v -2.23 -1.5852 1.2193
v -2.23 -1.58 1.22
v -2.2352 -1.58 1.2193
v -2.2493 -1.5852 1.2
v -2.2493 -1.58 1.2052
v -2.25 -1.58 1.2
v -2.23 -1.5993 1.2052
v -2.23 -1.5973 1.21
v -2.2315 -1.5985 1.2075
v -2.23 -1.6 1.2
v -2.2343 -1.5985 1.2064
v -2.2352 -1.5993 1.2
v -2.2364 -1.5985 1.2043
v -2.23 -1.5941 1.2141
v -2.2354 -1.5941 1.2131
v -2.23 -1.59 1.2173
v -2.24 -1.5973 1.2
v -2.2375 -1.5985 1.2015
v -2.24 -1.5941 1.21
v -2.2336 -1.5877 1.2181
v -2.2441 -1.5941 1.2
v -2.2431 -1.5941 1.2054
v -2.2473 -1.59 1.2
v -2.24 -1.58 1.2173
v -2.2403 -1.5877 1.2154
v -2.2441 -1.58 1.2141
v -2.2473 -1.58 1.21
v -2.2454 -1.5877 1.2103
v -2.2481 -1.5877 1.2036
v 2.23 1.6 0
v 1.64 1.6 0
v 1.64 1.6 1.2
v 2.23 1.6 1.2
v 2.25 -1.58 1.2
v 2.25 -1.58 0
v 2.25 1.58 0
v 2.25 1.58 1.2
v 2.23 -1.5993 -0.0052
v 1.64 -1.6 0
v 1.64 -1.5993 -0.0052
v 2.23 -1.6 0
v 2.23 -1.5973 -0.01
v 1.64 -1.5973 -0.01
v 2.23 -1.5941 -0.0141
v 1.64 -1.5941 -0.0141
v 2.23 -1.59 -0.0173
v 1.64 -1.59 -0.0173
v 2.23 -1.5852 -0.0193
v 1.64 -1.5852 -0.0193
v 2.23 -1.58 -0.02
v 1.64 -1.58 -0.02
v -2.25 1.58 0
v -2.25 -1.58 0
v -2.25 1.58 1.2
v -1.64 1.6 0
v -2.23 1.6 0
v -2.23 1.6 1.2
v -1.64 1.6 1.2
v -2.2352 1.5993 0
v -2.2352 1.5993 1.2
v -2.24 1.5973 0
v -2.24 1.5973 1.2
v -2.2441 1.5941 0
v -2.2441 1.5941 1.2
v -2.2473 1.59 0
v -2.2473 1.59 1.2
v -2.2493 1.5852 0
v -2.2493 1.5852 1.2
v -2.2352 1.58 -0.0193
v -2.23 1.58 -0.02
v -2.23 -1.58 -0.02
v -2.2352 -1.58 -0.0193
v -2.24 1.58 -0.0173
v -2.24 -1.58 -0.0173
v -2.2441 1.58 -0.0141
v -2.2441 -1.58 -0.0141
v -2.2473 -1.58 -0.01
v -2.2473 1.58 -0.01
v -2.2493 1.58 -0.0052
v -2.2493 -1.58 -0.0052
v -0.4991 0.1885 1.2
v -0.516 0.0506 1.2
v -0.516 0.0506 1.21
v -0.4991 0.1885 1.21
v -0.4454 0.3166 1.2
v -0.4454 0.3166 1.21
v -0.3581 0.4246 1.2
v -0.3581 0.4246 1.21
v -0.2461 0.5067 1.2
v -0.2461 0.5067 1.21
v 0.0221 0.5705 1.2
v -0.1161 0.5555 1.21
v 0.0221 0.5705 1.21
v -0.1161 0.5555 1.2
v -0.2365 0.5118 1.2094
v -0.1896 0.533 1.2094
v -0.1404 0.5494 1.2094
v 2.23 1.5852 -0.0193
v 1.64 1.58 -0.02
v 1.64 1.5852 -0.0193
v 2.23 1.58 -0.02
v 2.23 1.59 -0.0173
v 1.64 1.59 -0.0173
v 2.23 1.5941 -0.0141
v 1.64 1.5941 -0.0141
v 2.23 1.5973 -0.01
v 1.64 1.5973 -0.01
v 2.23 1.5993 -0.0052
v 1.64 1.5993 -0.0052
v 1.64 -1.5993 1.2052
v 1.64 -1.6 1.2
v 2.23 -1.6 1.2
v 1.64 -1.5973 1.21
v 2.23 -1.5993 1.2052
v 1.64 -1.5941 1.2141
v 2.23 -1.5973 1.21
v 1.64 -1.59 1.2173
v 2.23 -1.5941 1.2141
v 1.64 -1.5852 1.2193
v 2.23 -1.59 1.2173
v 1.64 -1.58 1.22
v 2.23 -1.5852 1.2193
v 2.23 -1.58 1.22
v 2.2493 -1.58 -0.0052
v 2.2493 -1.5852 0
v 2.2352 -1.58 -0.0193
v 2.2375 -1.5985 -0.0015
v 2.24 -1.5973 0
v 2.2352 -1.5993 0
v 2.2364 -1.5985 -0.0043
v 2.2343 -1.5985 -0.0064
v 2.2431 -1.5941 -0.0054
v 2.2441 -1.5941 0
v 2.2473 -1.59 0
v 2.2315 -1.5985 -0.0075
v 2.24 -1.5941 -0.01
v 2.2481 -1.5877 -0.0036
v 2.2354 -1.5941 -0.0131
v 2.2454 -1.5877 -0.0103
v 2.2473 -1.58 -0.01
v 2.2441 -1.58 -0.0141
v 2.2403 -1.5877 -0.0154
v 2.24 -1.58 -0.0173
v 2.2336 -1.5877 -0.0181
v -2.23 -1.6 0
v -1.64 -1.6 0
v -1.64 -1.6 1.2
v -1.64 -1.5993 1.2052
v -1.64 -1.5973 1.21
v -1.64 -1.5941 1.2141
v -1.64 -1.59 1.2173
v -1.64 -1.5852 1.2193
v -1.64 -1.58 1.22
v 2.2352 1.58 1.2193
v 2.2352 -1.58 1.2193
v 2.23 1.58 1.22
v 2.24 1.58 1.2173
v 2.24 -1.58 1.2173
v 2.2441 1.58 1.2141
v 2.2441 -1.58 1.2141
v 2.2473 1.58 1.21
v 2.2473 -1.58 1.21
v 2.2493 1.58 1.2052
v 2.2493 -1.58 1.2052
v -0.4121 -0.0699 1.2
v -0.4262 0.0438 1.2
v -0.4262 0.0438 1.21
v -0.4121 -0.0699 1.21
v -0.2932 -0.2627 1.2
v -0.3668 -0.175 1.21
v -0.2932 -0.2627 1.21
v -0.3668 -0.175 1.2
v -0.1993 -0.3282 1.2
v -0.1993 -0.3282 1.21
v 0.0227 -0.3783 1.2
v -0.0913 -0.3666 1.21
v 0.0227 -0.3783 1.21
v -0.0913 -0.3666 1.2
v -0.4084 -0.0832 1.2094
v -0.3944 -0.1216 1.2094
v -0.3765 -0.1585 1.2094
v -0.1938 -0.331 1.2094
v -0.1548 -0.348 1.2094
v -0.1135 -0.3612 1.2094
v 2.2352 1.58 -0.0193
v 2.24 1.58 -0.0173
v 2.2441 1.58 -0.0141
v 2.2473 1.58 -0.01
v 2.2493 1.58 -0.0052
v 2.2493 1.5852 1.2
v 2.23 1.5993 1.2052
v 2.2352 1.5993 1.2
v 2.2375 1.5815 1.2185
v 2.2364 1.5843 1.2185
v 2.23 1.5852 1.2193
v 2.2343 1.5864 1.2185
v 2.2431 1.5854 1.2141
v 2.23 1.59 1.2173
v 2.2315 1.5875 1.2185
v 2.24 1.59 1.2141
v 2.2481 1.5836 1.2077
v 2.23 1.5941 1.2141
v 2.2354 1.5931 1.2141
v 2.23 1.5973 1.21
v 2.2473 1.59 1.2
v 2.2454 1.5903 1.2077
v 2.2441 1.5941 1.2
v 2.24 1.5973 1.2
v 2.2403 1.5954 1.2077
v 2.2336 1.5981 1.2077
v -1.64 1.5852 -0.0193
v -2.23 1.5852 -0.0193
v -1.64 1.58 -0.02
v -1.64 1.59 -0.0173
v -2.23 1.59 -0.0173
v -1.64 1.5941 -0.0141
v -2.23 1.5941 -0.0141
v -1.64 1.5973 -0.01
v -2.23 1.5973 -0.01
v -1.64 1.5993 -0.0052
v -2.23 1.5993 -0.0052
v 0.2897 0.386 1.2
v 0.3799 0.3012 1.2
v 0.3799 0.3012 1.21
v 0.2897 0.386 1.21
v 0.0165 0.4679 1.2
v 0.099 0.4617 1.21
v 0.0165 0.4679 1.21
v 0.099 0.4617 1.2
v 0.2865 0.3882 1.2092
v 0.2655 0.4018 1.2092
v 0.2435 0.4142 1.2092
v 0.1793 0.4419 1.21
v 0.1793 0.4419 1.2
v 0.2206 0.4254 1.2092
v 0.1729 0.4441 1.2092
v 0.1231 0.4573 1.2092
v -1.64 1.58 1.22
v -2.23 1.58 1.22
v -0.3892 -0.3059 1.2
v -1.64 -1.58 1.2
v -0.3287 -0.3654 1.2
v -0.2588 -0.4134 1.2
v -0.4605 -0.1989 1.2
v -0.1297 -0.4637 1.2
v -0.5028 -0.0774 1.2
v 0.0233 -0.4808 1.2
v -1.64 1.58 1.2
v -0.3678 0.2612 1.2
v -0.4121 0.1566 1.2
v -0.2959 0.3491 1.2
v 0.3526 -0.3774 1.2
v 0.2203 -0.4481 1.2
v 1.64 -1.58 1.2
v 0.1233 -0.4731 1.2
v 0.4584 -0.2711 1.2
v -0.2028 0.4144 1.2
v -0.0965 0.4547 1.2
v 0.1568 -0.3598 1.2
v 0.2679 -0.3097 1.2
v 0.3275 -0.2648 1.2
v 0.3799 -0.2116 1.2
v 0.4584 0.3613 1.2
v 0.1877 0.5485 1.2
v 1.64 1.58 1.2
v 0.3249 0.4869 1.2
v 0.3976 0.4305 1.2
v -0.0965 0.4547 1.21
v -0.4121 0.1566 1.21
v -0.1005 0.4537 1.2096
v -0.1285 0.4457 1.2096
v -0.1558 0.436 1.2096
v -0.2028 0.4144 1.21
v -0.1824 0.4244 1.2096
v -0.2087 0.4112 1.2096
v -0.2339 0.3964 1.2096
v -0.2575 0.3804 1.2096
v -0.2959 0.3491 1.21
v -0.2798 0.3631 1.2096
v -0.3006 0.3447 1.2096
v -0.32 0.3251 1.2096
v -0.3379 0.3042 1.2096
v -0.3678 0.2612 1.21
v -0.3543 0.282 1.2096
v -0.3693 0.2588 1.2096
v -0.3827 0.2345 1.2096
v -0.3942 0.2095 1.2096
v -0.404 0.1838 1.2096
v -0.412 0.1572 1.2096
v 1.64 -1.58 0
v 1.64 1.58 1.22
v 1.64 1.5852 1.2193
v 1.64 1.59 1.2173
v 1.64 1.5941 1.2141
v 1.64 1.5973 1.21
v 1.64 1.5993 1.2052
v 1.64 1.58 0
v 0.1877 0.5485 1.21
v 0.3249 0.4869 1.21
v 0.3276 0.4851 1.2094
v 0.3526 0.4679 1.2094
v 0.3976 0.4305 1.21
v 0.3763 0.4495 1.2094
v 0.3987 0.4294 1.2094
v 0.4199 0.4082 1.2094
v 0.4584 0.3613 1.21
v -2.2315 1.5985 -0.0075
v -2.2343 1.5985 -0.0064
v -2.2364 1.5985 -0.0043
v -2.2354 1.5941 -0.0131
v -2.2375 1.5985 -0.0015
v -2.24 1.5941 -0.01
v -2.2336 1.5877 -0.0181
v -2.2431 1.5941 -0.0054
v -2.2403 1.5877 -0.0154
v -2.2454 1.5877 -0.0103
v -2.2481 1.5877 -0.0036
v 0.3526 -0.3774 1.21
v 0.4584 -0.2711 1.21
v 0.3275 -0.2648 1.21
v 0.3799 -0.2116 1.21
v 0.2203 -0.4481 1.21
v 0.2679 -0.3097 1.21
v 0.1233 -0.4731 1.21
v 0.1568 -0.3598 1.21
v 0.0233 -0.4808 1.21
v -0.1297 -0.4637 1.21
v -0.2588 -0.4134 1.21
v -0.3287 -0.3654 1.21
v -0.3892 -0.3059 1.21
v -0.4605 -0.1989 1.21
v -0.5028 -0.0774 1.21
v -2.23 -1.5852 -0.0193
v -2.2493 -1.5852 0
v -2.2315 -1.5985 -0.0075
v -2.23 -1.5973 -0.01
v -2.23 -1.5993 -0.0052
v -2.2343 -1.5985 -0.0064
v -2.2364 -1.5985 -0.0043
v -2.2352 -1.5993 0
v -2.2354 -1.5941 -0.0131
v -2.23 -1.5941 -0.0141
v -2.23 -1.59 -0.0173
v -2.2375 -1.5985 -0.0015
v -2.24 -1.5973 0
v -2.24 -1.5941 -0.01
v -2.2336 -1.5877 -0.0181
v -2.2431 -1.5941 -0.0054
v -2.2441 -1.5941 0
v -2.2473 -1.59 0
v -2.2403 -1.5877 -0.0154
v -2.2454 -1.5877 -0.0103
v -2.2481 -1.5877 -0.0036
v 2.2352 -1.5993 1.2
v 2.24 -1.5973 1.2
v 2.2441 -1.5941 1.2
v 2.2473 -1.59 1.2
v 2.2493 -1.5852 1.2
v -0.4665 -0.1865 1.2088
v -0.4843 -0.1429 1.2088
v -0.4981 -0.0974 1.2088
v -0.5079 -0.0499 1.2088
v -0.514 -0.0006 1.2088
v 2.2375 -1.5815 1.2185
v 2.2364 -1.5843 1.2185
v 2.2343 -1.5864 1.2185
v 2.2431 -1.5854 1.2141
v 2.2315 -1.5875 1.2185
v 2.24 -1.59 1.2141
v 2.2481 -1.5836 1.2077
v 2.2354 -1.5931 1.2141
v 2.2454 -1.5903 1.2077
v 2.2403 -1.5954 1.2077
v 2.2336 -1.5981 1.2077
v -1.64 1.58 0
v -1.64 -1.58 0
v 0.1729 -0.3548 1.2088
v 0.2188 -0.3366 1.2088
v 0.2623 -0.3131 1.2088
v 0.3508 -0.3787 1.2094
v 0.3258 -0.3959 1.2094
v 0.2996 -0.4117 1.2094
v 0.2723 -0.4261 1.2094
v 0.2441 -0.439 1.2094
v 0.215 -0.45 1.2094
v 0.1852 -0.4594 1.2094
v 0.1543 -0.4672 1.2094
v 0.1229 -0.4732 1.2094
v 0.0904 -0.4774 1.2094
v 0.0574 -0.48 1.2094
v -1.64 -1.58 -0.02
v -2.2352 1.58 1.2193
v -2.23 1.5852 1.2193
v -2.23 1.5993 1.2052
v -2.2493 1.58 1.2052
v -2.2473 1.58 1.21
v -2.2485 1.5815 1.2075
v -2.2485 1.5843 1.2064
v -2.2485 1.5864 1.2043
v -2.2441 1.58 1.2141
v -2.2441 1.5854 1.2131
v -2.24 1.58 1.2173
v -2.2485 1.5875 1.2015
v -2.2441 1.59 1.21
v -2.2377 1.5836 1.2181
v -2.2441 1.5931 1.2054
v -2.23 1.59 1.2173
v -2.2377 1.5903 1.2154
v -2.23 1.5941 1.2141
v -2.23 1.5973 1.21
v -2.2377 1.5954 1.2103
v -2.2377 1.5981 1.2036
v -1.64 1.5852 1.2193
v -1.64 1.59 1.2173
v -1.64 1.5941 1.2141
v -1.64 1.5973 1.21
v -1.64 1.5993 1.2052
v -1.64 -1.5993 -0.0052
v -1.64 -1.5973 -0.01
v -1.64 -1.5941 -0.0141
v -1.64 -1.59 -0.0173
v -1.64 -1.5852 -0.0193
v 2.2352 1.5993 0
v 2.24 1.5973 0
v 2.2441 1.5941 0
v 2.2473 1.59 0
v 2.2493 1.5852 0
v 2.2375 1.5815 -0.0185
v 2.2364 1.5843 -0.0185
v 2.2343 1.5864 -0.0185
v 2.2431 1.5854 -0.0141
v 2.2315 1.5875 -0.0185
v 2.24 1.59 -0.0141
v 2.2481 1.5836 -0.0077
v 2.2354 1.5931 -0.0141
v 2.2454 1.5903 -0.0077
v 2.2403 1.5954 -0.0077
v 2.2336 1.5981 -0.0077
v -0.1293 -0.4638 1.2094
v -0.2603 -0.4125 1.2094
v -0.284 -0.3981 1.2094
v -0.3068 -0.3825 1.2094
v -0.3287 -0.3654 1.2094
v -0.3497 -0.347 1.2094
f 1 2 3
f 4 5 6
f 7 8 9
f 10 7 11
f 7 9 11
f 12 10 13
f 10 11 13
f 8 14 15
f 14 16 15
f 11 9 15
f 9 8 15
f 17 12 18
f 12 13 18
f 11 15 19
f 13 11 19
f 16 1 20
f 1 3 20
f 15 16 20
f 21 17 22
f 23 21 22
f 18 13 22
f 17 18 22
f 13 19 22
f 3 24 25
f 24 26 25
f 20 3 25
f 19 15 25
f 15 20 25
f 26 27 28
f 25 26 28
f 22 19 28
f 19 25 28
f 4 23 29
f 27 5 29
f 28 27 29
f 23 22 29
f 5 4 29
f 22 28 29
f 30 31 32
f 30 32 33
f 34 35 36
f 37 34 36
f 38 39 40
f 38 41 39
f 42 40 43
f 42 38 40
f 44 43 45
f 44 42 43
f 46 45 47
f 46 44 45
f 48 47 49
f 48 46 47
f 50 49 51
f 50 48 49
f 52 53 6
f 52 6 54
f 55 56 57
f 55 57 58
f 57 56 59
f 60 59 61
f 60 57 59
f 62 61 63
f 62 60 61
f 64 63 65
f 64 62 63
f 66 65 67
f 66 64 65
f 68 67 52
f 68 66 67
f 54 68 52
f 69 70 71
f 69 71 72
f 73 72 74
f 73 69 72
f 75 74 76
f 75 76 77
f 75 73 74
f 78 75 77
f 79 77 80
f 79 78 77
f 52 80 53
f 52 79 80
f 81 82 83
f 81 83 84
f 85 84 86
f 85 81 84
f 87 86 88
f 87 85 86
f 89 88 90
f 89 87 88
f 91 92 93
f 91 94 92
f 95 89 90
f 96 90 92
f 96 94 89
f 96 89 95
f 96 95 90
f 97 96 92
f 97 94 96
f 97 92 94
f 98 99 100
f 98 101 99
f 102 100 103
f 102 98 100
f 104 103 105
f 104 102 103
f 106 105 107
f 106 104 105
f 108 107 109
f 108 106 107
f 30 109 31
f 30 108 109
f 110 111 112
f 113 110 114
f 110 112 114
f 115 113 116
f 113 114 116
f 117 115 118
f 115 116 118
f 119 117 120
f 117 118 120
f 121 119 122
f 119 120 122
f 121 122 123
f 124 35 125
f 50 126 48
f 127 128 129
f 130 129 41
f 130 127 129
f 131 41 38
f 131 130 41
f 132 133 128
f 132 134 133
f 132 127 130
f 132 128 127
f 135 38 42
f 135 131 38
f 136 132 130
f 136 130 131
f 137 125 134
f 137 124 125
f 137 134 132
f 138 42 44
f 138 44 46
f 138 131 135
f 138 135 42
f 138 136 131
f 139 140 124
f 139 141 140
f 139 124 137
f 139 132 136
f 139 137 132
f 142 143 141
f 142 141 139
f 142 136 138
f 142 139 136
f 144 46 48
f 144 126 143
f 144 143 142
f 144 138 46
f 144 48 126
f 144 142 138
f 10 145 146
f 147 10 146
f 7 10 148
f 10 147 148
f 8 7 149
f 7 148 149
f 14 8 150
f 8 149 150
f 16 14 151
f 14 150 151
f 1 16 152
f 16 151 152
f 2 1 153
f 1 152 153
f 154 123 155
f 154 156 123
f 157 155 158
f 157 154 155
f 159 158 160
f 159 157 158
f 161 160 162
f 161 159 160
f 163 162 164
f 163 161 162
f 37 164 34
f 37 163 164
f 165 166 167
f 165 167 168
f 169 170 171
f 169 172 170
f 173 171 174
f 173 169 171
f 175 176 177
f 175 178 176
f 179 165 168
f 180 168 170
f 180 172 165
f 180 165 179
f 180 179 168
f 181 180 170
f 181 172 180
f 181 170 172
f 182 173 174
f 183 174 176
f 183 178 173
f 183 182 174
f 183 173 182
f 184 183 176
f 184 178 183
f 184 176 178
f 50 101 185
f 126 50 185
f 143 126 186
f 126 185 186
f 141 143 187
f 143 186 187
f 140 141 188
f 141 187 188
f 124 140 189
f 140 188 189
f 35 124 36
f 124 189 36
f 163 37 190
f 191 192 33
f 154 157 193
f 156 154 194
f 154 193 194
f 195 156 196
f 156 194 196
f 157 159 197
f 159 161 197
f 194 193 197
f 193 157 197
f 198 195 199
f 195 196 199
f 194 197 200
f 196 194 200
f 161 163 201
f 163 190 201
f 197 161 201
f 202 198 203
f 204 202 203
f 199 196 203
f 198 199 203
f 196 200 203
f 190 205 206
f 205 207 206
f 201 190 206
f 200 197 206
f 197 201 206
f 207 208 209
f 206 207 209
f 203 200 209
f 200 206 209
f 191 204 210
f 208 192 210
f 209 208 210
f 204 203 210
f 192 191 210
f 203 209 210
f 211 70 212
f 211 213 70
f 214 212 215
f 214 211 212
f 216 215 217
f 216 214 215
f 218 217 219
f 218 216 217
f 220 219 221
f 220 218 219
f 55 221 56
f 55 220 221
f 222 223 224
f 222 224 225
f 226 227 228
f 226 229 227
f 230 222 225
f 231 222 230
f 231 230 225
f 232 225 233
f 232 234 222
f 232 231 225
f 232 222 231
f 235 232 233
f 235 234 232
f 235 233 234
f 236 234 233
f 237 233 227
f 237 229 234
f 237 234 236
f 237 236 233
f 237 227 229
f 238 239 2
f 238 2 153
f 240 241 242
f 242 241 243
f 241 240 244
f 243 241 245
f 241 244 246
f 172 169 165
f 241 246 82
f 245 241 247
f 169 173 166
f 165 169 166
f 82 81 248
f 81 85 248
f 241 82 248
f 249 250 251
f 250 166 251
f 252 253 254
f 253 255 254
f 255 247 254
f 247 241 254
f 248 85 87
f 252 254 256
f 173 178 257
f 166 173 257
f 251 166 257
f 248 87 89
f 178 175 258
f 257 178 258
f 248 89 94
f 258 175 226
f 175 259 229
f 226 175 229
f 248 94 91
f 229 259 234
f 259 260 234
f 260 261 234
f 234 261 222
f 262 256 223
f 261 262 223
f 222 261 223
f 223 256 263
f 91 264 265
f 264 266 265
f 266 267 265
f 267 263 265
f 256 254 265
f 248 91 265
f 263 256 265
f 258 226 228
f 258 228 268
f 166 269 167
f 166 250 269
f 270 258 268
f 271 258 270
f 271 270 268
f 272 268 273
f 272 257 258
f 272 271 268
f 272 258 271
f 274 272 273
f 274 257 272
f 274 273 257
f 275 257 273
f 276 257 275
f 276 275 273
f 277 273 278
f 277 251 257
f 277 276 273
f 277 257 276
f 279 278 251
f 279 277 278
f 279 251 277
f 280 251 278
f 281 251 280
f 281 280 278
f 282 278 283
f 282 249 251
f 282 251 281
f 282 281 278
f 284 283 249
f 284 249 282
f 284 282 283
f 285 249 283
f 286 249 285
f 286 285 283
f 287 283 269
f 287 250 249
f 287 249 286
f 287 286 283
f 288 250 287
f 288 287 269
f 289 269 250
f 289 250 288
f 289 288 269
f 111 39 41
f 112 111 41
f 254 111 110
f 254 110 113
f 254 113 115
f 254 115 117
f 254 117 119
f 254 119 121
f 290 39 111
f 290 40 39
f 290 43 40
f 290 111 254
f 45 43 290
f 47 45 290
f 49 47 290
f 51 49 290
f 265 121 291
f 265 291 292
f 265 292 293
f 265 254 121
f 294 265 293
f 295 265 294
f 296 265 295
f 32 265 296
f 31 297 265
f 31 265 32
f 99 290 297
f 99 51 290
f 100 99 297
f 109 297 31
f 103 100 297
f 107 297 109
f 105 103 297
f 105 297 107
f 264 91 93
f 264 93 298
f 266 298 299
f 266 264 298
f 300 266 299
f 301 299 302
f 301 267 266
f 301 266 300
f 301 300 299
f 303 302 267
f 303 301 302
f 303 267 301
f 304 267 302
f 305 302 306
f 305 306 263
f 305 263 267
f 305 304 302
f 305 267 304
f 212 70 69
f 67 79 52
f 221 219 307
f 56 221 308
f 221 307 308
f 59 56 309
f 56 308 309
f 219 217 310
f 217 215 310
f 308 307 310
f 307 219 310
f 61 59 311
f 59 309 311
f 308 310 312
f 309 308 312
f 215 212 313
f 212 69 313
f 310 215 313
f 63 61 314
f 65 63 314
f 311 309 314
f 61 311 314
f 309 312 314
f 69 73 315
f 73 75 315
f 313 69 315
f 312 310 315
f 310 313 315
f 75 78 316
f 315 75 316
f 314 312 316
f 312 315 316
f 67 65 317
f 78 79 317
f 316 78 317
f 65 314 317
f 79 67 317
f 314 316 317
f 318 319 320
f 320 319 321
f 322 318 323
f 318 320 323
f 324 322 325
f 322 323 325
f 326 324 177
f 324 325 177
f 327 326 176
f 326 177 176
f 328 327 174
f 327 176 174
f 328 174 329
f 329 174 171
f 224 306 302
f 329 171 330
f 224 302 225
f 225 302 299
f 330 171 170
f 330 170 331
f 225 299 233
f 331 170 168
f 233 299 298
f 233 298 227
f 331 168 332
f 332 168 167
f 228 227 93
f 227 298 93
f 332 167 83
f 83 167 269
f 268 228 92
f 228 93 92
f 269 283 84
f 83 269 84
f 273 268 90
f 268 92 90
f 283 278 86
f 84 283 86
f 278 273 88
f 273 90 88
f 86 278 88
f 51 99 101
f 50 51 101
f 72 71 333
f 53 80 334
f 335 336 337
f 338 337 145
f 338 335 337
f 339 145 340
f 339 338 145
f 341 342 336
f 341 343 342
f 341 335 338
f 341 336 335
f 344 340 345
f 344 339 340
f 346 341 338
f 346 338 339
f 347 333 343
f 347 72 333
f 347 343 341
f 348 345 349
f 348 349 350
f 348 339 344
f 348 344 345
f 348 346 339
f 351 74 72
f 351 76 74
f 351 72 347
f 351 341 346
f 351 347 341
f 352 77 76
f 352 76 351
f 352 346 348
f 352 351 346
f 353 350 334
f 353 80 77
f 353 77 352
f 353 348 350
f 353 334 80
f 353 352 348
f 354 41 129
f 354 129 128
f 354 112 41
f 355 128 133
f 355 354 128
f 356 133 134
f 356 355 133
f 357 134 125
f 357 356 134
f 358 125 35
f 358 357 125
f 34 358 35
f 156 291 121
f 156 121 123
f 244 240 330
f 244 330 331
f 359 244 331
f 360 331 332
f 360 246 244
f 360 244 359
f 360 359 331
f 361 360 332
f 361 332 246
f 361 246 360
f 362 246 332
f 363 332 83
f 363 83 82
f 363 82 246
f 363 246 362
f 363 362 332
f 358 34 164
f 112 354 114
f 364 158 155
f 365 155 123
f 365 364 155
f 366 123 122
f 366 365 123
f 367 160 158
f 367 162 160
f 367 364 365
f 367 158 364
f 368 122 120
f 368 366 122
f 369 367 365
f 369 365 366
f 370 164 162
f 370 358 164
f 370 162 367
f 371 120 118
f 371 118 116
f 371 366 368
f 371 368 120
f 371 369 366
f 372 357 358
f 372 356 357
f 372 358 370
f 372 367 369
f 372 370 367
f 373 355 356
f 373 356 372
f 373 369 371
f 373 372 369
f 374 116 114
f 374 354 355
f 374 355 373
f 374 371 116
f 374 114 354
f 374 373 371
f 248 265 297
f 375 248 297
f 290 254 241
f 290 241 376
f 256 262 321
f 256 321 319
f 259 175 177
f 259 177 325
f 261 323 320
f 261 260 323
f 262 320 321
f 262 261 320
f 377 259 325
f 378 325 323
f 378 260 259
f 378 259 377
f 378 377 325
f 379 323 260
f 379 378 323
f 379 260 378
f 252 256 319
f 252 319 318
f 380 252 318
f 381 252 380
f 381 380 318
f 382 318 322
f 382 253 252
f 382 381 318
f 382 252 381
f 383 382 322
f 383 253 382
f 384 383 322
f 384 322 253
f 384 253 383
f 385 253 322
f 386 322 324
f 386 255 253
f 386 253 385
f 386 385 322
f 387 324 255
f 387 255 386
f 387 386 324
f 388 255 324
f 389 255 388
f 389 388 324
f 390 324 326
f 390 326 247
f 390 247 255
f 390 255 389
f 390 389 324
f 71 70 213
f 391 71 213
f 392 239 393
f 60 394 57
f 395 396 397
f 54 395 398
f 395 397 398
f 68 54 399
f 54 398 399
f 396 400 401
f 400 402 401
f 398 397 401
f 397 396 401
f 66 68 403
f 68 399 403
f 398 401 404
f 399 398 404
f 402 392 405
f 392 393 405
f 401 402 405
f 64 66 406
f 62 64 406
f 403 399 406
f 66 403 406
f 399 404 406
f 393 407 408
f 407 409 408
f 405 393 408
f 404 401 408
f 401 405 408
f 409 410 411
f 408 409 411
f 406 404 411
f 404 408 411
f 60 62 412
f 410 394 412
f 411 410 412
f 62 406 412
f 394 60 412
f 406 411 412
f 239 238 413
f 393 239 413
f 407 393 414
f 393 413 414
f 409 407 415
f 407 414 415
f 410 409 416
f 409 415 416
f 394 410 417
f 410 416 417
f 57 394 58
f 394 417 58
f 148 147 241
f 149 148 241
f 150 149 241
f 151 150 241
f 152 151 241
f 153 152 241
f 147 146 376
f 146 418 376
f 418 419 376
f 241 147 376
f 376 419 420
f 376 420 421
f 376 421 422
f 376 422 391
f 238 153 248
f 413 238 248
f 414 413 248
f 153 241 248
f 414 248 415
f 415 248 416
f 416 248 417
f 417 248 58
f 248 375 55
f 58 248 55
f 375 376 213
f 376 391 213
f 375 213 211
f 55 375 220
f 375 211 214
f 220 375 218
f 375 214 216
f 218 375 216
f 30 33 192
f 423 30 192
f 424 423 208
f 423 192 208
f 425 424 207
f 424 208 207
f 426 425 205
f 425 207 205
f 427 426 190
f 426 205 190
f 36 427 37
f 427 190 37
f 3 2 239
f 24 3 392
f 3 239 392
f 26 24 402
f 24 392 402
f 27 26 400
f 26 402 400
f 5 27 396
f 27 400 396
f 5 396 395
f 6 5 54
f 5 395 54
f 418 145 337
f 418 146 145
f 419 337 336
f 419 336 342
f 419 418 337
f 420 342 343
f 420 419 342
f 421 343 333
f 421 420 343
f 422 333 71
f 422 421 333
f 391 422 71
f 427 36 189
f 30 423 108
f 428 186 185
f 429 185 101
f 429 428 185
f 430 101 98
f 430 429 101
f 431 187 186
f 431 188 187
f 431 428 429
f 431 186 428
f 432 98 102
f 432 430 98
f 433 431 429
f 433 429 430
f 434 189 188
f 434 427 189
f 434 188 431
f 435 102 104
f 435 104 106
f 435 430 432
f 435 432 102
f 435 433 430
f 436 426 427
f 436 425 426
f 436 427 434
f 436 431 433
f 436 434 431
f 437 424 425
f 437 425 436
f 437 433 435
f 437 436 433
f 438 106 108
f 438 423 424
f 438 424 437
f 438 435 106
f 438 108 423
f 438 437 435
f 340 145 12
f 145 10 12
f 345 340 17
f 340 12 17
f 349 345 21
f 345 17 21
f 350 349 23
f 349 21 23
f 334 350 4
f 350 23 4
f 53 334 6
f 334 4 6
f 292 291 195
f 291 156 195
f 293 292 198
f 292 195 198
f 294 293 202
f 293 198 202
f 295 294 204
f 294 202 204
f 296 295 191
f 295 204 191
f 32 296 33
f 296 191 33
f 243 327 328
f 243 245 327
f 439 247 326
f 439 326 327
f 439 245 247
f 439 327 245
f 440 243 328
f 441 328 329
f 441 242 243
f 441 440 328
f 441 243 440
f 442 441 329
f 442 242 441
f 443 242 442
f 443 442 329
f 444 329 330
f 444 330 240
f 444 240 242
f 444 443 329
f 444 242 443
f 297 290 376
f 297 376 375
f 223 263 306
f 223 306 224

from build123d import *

# Parameters (mm, degrees)
EXTRUDE_1_DEPTH        = 1.22
EXTRUDE_1_DEPTH_BACK   = 0.02
SKETCH_3_W             = 0.61
SKETCH_3_H             = 3.2
EXTRUDE_1_2_DEPTH      = 1.22
EXTRUDE_1_2_DEPTH_BACK = 0.02
SKETCH_5_W             = 1.2
SKETCH_5_H             = 3.16
EXTRUDE_3_DEPTH        = 1.66
FILLET_3_R             = 0.02
EXTRUDE_4_DEPTH        = 0.01


with BuildPart() as part:
    # 草图3 → 凸台-拉伸1 (new, two sides: drawn at the far end of the back side and taken through both)
    with BuildSketch(Plane.XY.offset(-EXTRUDE_1_DEPTH_BACK)):
        with Locations((-1.945, 0)):
            Rectangle(SKETCH_3_W, SKETCH_3_H)
    extrude(amount=EXTRUDE_1_DEPTH + EXTRUDE_1_DEPTH_BACK)



with BuildPart() as body_2:
    # 草图3 → Extrude 1 2 (new, two sides: drawn at the far end of the back side and taken through both)
    with BuildSketch(Plane.XY.offset(-EXTRUDE_1_2_DEPTH_BACK)):
        with Locations((1.945, 0)):
            Rectangle(SKETCH_3_W, SKETCH_3_H)
    extrude(amount=EXTRUDE_1_2_DEPTH + EXTRUDE_1_2_DEPTH_BACK)


with BuildPart() as part_1:
    add(part.part)

    add(body_2.part)  # 凸台-拉伸3 merges body 2
    # 草图5 → 凸台-拉伸3 (add, symmetric)
    with BuildSketch(Plane(origin=(0, 0, 0), x_dir=(0, 0, -1), z_dir=(1, 0, 0))):
        with Locations((-0.6, 0)):
            Rectangle(SKETCH_5_W, SKETCH_5_H)
    extrude(amount=EXTRUDE_3_DEPTH, both=True)

    # 圆角3
    fillet_3_edges = [part_1.edges().sort_by_distance(p)[0] for p in [
        (-2.25, 0, -0.02),
        (-1.945, 1.6, 1.22),
        (-1.945, -1.6, -0.02),
        (-2.25, 0, 1.22),
        (-1.945, -1.6, 1.22),
        (2.25, 1.6, 0.6),
        (2.25, 0, -0.02),
        (2.25, -1.6, 0.6),
        (1.945, -1.6, -0.02),
        (1.945, 1.6, -0.02),
        (2.25, 0, 1.22),
        (1.945, 1.6, 1.22),
        (1.945, -1.6, 1.22),
        (-1.945, 1.6, -0.02),
        (-2.25, -1.6, 0.6),
        (-2.25, 1.6, 0.6),
    ]]
    fillet(fillet_3_edges, radius=FILLET_3_R)

    # 草图6 → 凸台-拉伸4 (add)
    with BuildSketch(Plane.XY.offset(1.2)):
        with BuildLine():
            Line((0.458404382, 0.361329361), (0.379878741, 0.301233207))
            add(Edge.make_bspline(
                [(0.379878741, 0.301233207), (0.374277059, 0.307909199), (0.363149217, 0.321171175), (0.345246588, 0.339793902), (0.326588975, 0.357241119), (0.307183512, 0.373595942), (0.286680907, 0.388286446), (0.265577821, 0.40207819), (0.243521237, 0.414440401), (0.213020741, 0.429429826), (0.173121356, 0.445071584), (0.122894259, 0.458186793), (0.070462517, 0.4665357), (0.034691774, 0.467439941), (0.016497331, 0.467899874)],
                knots=[0, 0, 0, 0, 0.757959112, 1.505699292, 2.245454638, 2.979532153, 3.711538275, 4.438200793, 5.171680507, 5.909471876, 7.393775596, 8.890124382, 10.418191784, 12, 12, 12, 12], degree=3))
            add(Edge.make_bspline(
                [(0.016497331, 0.467899874), (0.006473531, 0.467784456), (-0.013481038, 0.467554692), (-0.043094888, 0.464523513), (-0.072155759, 0.460263167), (-0.10064475, 0.453941646), (-0.128525595, 0.445949469), (-0.155980567, 0.436399351), (-0.182612167, 0.424583683), (-0.208788806, 0.41152418), (-0.233868581, 0.396773481), (-0.257598595, 0.380683952), (-0.2798923, 0.363435639), (-0.300767332, 0.344963894), (-0.320245031, 0.325351906), (-0.338184263, 0.304390665), (-0.354522952, 0.282147187), (-0.369584959, 0.258914785), (-0.383074311, 0.23476113), (-0.394368562, 0.209596824), (-0.404370026, 0.183852795), (-0.412284095, 0.157238177), (-0.418548243, 0.129940244), (-0.422870432, 0.101885733), (-0.425867138, 0.073133254), (-0.42609576, 0.053644879), (-0.426211002, 0.043821348)],
                knots=[0, 0, 0, 0, 1.054917814, 2.100044995, 3.131103042, 4.146048494, 5.169673617, 6.183595914, 7.203665975, 8.234915748, 9.262203917, 10.264457458, 11.251630812, 12.227803204, 13.197192746, 14.159520551, 15.12972552, 16.100847026, 17.073214652, 18.039054194, 19.002613845, 19.979014051, 20.95965708, 21.949030935, 22.966165397, 24, 24, 24, 24], degree=3))
            add(Edge.make_bspline(
                [(-0.426211002, 0.043821348), (-0.425850483, 0.029040971), (-0.42514265, 2.1661e-05), (-0.418843126, -0.042484227), (-0.409270243, -0.08320442), (-0.394922935, -0.121884375), (-0.377231778, -0.159001049), (-0.354877317, -0.193926435), (-0.328986878, -0.227188311), (-0.299194187, -0.258000582), (-0.266506811, -0.28614736), (-0.231435979, -0.310933241), (-0.194069039, -0.331594636), (-0.154818574, -0.348787763), (-0.113382541, -0.362003971), (-0.069835455, -0.371308006), (-0.024272027, -0.377377201), (0.006862087, -0.377958255), (0.022707267, -0.378253972)],
                knots=[0, 0, 0, 0, 1.029171465, 2.020641659, 2.987623507, 3.938342917, 4.889210282, 5.84687017, 6.821220943, 7.821438502, 8.827599549, 9.822697543, 10.807740252, 11.797342354, 12.80366471, 13.83203677, 14.896651826, 16, 16, 16, 16], degree=3))
            add(Edge.make_bspline(
                [(0.022707267, -0.378253972), (0.040165178, -0.377771464), (0.074526524, -0.376821771), (0.124917388, -0.368776272), (0.173156178, -0.355731152), (0.219245489, -0.337474603), (0.263055388, -0.313741664), (0.304654434, -0.284970842), (0.344077739, -0.250888461), (0.36778382, -0.22486471), (0.379878741, -0.211587305)],
                knots=[0, 0, 0, 0, 1.028121516, 2.023589091, 2.998037872, 3.967518031, 4.937445131, 5.927275754, 6.942489185, 8, 8, 8, 8], degree=3))
            Line((0.379878741, -0.211587305), (0.458404382, -0.271082498))
            add(Edge.make_bspline(
                [(0.458404382, -0.271082498), (0.452084922, -0.279236341), (0.439476272, -0.295504972), (0.419059696, -0.318439746), (0.397551897, -0.340012327), (0.374793123, -0.360048791), (0.351045182, -0.378950066), (0.325881664, -0.396179161), (0.299633369, -0.411976557), (0.272389232, -0.426441392), (0.2441782, -0.439274891), (0.215034076, -0.450261682), (0.185082483, -0.459725936), (0.154322052, -0.467512204), (0.122688979, -0.473589656), (0.090297415, -0.477652421), (0.05707745, -0.480435825), (0.034665616, -0.480689515), (0.023308229, -0.480818075)],
                knots=[0, 0, 0, 0, 0.986787822, 1.968848986, 2.935600012, 3.899624008, 4.868462664, 5.837806735, 6.815139263, 7.798259679, 8.787526145, 9.778297419, 10.776456485, 11.791383307, 12.812564526, 13.85620153, 14.913611965, 16, 16, 16, 16], degree=3))
            add(Edge.make_bspline(
                [(0.023308229, -0.480818075), (0.012552895, -0.48074322), (-0.008714445, -0.480595203), (-0.040114088, -0.478197441), (-0.07068254, -0.474926088), (-0.100332433, -0.470000336), (-0.129225569, -0.464187667), (-0.157100021, -0.45639588), (-0.184230082, -0.447667546), (-0.21050675, -0.437408979), (-0.235952379, -0.425832927), (-0.260484896, -0.412749624), (-0.28409302, -0.398269091), (-0.307008854, -0.382710517), (-0.328893878, -0.365574145), (-0.349937743, -0.347097964), (-0.37025845, -0.327344246), (-0.382830646, -0.313100002), (-0.389151707, -0.305938267)],
                knots=[0, 0, 0, 0, 1.114604814, 2.203992996, 3.262667896, 4.300477797, 5.318619304, 6.316056647, 7.298880507, 8.271930387, 9.238335007, 10.195173496, 11.151986948, 12.108099108, 13.064862484, 14.031167946, 15.010108607, 16, 16, 16, 16], degree=3))
            add(Edge.make_bspline(
                [(-0.389151707, -0.305938267), (-0.399276177, -0.293497927), (-0.419402885, -0.268767439), (-0.44515308, -0.22868573), (-0.467195239, -0.18683767), (-0.48501693, -0.143003405), (-0.49894914, -0.097281294), (-0.50860091, -0.04964829), (-0.514872797, -0.000148878), (-0.515590022, 0.033518776), (-0.515954592, 0.050632246)],
                knots=[0, 0, 0, 0, 0.994628077, 1.977248131, 2.950237994, 3.925870899, 4.908910175, 5.911660606, 6.938484602, 8, 8, 8, 8], degree=3))
            add(Edge.make_bspline(
                [(-0.515954592, 0.050632246), (-0.515510251, 0.068619518), (-0.514636038, 0.104008354), (-0.507208668, 0.155943769), (-0.49526044, 0.205701312), (-0.478289901, 0.253188096), (-0.456774086, 0.29865389), (-0.430195053, 0.341751377), (-0.398861584, 0.382756177), (-0.363019422, 0.421046106), (-0.323714469, 0.45605735), (-0.281623379, 0.486859122), (-0.236828537, 0.512492698), (-0.189823437, 0.533920173), (-0.140256099, 0.55039002), (-0.08823228, 0.561919502), (-0.033849732, 0.569095821), (0.003253818, 0.570003023), (0.022106305, 0.570463977)],
                knots=[0, 0, 0, 0, 1.032925535, 2.032216505, 3.007276963, 3.968222605, 4.92396291, 5.891752235, 6.871517503, 7.883894988, 8.900124299, 9.891468569, 10.874487609, 11.85992873, 12.854644235, 13.869047385, 14.917252991, 16, 16, 16, 16], degree=3))
            add(Edge.make_bspline(
                [(0.022106305, 0.570463977), (0.033596155, 0.570326223), (0.056339154, 0.570053553), (0.089982769, 0.567394655), (0.122737719, 0.562962196), (0.154626571, 0.556929034), (0.185804462, 0.549441228), (0.216033102, 0.539686857), (0.24548987, 0.528533562), (0.273988986, 0.515688286), (0.301393715, 0.501269217), (0.32769552, 0.485436182), (0.35268548, 0.468208809), (0.376539436, 0.449733616), (0.398858354, 0.429619742), (0.420275919, 0.408420428), (0.440064799, 0.38552505), (0.452279997, 0.369409355), (0.458404382, 0.361329361)],
                knots=[0, 0, 0, 0, 1.096760587, 2.17092713, 3.219439832, 4.250915756, 5.268269357, 6.278326846, 7.281116186, 8.274029601, 9.260640565, 10.235837813, 11.203064059, 12.156899882, 13.114053108, 14.069676657, 15.032185724, 16, 16, 16, 16], degree=3))
        make_face()
    extrude(amount=EXTRUDE_4_DEPTH)


solid = part_1.part
